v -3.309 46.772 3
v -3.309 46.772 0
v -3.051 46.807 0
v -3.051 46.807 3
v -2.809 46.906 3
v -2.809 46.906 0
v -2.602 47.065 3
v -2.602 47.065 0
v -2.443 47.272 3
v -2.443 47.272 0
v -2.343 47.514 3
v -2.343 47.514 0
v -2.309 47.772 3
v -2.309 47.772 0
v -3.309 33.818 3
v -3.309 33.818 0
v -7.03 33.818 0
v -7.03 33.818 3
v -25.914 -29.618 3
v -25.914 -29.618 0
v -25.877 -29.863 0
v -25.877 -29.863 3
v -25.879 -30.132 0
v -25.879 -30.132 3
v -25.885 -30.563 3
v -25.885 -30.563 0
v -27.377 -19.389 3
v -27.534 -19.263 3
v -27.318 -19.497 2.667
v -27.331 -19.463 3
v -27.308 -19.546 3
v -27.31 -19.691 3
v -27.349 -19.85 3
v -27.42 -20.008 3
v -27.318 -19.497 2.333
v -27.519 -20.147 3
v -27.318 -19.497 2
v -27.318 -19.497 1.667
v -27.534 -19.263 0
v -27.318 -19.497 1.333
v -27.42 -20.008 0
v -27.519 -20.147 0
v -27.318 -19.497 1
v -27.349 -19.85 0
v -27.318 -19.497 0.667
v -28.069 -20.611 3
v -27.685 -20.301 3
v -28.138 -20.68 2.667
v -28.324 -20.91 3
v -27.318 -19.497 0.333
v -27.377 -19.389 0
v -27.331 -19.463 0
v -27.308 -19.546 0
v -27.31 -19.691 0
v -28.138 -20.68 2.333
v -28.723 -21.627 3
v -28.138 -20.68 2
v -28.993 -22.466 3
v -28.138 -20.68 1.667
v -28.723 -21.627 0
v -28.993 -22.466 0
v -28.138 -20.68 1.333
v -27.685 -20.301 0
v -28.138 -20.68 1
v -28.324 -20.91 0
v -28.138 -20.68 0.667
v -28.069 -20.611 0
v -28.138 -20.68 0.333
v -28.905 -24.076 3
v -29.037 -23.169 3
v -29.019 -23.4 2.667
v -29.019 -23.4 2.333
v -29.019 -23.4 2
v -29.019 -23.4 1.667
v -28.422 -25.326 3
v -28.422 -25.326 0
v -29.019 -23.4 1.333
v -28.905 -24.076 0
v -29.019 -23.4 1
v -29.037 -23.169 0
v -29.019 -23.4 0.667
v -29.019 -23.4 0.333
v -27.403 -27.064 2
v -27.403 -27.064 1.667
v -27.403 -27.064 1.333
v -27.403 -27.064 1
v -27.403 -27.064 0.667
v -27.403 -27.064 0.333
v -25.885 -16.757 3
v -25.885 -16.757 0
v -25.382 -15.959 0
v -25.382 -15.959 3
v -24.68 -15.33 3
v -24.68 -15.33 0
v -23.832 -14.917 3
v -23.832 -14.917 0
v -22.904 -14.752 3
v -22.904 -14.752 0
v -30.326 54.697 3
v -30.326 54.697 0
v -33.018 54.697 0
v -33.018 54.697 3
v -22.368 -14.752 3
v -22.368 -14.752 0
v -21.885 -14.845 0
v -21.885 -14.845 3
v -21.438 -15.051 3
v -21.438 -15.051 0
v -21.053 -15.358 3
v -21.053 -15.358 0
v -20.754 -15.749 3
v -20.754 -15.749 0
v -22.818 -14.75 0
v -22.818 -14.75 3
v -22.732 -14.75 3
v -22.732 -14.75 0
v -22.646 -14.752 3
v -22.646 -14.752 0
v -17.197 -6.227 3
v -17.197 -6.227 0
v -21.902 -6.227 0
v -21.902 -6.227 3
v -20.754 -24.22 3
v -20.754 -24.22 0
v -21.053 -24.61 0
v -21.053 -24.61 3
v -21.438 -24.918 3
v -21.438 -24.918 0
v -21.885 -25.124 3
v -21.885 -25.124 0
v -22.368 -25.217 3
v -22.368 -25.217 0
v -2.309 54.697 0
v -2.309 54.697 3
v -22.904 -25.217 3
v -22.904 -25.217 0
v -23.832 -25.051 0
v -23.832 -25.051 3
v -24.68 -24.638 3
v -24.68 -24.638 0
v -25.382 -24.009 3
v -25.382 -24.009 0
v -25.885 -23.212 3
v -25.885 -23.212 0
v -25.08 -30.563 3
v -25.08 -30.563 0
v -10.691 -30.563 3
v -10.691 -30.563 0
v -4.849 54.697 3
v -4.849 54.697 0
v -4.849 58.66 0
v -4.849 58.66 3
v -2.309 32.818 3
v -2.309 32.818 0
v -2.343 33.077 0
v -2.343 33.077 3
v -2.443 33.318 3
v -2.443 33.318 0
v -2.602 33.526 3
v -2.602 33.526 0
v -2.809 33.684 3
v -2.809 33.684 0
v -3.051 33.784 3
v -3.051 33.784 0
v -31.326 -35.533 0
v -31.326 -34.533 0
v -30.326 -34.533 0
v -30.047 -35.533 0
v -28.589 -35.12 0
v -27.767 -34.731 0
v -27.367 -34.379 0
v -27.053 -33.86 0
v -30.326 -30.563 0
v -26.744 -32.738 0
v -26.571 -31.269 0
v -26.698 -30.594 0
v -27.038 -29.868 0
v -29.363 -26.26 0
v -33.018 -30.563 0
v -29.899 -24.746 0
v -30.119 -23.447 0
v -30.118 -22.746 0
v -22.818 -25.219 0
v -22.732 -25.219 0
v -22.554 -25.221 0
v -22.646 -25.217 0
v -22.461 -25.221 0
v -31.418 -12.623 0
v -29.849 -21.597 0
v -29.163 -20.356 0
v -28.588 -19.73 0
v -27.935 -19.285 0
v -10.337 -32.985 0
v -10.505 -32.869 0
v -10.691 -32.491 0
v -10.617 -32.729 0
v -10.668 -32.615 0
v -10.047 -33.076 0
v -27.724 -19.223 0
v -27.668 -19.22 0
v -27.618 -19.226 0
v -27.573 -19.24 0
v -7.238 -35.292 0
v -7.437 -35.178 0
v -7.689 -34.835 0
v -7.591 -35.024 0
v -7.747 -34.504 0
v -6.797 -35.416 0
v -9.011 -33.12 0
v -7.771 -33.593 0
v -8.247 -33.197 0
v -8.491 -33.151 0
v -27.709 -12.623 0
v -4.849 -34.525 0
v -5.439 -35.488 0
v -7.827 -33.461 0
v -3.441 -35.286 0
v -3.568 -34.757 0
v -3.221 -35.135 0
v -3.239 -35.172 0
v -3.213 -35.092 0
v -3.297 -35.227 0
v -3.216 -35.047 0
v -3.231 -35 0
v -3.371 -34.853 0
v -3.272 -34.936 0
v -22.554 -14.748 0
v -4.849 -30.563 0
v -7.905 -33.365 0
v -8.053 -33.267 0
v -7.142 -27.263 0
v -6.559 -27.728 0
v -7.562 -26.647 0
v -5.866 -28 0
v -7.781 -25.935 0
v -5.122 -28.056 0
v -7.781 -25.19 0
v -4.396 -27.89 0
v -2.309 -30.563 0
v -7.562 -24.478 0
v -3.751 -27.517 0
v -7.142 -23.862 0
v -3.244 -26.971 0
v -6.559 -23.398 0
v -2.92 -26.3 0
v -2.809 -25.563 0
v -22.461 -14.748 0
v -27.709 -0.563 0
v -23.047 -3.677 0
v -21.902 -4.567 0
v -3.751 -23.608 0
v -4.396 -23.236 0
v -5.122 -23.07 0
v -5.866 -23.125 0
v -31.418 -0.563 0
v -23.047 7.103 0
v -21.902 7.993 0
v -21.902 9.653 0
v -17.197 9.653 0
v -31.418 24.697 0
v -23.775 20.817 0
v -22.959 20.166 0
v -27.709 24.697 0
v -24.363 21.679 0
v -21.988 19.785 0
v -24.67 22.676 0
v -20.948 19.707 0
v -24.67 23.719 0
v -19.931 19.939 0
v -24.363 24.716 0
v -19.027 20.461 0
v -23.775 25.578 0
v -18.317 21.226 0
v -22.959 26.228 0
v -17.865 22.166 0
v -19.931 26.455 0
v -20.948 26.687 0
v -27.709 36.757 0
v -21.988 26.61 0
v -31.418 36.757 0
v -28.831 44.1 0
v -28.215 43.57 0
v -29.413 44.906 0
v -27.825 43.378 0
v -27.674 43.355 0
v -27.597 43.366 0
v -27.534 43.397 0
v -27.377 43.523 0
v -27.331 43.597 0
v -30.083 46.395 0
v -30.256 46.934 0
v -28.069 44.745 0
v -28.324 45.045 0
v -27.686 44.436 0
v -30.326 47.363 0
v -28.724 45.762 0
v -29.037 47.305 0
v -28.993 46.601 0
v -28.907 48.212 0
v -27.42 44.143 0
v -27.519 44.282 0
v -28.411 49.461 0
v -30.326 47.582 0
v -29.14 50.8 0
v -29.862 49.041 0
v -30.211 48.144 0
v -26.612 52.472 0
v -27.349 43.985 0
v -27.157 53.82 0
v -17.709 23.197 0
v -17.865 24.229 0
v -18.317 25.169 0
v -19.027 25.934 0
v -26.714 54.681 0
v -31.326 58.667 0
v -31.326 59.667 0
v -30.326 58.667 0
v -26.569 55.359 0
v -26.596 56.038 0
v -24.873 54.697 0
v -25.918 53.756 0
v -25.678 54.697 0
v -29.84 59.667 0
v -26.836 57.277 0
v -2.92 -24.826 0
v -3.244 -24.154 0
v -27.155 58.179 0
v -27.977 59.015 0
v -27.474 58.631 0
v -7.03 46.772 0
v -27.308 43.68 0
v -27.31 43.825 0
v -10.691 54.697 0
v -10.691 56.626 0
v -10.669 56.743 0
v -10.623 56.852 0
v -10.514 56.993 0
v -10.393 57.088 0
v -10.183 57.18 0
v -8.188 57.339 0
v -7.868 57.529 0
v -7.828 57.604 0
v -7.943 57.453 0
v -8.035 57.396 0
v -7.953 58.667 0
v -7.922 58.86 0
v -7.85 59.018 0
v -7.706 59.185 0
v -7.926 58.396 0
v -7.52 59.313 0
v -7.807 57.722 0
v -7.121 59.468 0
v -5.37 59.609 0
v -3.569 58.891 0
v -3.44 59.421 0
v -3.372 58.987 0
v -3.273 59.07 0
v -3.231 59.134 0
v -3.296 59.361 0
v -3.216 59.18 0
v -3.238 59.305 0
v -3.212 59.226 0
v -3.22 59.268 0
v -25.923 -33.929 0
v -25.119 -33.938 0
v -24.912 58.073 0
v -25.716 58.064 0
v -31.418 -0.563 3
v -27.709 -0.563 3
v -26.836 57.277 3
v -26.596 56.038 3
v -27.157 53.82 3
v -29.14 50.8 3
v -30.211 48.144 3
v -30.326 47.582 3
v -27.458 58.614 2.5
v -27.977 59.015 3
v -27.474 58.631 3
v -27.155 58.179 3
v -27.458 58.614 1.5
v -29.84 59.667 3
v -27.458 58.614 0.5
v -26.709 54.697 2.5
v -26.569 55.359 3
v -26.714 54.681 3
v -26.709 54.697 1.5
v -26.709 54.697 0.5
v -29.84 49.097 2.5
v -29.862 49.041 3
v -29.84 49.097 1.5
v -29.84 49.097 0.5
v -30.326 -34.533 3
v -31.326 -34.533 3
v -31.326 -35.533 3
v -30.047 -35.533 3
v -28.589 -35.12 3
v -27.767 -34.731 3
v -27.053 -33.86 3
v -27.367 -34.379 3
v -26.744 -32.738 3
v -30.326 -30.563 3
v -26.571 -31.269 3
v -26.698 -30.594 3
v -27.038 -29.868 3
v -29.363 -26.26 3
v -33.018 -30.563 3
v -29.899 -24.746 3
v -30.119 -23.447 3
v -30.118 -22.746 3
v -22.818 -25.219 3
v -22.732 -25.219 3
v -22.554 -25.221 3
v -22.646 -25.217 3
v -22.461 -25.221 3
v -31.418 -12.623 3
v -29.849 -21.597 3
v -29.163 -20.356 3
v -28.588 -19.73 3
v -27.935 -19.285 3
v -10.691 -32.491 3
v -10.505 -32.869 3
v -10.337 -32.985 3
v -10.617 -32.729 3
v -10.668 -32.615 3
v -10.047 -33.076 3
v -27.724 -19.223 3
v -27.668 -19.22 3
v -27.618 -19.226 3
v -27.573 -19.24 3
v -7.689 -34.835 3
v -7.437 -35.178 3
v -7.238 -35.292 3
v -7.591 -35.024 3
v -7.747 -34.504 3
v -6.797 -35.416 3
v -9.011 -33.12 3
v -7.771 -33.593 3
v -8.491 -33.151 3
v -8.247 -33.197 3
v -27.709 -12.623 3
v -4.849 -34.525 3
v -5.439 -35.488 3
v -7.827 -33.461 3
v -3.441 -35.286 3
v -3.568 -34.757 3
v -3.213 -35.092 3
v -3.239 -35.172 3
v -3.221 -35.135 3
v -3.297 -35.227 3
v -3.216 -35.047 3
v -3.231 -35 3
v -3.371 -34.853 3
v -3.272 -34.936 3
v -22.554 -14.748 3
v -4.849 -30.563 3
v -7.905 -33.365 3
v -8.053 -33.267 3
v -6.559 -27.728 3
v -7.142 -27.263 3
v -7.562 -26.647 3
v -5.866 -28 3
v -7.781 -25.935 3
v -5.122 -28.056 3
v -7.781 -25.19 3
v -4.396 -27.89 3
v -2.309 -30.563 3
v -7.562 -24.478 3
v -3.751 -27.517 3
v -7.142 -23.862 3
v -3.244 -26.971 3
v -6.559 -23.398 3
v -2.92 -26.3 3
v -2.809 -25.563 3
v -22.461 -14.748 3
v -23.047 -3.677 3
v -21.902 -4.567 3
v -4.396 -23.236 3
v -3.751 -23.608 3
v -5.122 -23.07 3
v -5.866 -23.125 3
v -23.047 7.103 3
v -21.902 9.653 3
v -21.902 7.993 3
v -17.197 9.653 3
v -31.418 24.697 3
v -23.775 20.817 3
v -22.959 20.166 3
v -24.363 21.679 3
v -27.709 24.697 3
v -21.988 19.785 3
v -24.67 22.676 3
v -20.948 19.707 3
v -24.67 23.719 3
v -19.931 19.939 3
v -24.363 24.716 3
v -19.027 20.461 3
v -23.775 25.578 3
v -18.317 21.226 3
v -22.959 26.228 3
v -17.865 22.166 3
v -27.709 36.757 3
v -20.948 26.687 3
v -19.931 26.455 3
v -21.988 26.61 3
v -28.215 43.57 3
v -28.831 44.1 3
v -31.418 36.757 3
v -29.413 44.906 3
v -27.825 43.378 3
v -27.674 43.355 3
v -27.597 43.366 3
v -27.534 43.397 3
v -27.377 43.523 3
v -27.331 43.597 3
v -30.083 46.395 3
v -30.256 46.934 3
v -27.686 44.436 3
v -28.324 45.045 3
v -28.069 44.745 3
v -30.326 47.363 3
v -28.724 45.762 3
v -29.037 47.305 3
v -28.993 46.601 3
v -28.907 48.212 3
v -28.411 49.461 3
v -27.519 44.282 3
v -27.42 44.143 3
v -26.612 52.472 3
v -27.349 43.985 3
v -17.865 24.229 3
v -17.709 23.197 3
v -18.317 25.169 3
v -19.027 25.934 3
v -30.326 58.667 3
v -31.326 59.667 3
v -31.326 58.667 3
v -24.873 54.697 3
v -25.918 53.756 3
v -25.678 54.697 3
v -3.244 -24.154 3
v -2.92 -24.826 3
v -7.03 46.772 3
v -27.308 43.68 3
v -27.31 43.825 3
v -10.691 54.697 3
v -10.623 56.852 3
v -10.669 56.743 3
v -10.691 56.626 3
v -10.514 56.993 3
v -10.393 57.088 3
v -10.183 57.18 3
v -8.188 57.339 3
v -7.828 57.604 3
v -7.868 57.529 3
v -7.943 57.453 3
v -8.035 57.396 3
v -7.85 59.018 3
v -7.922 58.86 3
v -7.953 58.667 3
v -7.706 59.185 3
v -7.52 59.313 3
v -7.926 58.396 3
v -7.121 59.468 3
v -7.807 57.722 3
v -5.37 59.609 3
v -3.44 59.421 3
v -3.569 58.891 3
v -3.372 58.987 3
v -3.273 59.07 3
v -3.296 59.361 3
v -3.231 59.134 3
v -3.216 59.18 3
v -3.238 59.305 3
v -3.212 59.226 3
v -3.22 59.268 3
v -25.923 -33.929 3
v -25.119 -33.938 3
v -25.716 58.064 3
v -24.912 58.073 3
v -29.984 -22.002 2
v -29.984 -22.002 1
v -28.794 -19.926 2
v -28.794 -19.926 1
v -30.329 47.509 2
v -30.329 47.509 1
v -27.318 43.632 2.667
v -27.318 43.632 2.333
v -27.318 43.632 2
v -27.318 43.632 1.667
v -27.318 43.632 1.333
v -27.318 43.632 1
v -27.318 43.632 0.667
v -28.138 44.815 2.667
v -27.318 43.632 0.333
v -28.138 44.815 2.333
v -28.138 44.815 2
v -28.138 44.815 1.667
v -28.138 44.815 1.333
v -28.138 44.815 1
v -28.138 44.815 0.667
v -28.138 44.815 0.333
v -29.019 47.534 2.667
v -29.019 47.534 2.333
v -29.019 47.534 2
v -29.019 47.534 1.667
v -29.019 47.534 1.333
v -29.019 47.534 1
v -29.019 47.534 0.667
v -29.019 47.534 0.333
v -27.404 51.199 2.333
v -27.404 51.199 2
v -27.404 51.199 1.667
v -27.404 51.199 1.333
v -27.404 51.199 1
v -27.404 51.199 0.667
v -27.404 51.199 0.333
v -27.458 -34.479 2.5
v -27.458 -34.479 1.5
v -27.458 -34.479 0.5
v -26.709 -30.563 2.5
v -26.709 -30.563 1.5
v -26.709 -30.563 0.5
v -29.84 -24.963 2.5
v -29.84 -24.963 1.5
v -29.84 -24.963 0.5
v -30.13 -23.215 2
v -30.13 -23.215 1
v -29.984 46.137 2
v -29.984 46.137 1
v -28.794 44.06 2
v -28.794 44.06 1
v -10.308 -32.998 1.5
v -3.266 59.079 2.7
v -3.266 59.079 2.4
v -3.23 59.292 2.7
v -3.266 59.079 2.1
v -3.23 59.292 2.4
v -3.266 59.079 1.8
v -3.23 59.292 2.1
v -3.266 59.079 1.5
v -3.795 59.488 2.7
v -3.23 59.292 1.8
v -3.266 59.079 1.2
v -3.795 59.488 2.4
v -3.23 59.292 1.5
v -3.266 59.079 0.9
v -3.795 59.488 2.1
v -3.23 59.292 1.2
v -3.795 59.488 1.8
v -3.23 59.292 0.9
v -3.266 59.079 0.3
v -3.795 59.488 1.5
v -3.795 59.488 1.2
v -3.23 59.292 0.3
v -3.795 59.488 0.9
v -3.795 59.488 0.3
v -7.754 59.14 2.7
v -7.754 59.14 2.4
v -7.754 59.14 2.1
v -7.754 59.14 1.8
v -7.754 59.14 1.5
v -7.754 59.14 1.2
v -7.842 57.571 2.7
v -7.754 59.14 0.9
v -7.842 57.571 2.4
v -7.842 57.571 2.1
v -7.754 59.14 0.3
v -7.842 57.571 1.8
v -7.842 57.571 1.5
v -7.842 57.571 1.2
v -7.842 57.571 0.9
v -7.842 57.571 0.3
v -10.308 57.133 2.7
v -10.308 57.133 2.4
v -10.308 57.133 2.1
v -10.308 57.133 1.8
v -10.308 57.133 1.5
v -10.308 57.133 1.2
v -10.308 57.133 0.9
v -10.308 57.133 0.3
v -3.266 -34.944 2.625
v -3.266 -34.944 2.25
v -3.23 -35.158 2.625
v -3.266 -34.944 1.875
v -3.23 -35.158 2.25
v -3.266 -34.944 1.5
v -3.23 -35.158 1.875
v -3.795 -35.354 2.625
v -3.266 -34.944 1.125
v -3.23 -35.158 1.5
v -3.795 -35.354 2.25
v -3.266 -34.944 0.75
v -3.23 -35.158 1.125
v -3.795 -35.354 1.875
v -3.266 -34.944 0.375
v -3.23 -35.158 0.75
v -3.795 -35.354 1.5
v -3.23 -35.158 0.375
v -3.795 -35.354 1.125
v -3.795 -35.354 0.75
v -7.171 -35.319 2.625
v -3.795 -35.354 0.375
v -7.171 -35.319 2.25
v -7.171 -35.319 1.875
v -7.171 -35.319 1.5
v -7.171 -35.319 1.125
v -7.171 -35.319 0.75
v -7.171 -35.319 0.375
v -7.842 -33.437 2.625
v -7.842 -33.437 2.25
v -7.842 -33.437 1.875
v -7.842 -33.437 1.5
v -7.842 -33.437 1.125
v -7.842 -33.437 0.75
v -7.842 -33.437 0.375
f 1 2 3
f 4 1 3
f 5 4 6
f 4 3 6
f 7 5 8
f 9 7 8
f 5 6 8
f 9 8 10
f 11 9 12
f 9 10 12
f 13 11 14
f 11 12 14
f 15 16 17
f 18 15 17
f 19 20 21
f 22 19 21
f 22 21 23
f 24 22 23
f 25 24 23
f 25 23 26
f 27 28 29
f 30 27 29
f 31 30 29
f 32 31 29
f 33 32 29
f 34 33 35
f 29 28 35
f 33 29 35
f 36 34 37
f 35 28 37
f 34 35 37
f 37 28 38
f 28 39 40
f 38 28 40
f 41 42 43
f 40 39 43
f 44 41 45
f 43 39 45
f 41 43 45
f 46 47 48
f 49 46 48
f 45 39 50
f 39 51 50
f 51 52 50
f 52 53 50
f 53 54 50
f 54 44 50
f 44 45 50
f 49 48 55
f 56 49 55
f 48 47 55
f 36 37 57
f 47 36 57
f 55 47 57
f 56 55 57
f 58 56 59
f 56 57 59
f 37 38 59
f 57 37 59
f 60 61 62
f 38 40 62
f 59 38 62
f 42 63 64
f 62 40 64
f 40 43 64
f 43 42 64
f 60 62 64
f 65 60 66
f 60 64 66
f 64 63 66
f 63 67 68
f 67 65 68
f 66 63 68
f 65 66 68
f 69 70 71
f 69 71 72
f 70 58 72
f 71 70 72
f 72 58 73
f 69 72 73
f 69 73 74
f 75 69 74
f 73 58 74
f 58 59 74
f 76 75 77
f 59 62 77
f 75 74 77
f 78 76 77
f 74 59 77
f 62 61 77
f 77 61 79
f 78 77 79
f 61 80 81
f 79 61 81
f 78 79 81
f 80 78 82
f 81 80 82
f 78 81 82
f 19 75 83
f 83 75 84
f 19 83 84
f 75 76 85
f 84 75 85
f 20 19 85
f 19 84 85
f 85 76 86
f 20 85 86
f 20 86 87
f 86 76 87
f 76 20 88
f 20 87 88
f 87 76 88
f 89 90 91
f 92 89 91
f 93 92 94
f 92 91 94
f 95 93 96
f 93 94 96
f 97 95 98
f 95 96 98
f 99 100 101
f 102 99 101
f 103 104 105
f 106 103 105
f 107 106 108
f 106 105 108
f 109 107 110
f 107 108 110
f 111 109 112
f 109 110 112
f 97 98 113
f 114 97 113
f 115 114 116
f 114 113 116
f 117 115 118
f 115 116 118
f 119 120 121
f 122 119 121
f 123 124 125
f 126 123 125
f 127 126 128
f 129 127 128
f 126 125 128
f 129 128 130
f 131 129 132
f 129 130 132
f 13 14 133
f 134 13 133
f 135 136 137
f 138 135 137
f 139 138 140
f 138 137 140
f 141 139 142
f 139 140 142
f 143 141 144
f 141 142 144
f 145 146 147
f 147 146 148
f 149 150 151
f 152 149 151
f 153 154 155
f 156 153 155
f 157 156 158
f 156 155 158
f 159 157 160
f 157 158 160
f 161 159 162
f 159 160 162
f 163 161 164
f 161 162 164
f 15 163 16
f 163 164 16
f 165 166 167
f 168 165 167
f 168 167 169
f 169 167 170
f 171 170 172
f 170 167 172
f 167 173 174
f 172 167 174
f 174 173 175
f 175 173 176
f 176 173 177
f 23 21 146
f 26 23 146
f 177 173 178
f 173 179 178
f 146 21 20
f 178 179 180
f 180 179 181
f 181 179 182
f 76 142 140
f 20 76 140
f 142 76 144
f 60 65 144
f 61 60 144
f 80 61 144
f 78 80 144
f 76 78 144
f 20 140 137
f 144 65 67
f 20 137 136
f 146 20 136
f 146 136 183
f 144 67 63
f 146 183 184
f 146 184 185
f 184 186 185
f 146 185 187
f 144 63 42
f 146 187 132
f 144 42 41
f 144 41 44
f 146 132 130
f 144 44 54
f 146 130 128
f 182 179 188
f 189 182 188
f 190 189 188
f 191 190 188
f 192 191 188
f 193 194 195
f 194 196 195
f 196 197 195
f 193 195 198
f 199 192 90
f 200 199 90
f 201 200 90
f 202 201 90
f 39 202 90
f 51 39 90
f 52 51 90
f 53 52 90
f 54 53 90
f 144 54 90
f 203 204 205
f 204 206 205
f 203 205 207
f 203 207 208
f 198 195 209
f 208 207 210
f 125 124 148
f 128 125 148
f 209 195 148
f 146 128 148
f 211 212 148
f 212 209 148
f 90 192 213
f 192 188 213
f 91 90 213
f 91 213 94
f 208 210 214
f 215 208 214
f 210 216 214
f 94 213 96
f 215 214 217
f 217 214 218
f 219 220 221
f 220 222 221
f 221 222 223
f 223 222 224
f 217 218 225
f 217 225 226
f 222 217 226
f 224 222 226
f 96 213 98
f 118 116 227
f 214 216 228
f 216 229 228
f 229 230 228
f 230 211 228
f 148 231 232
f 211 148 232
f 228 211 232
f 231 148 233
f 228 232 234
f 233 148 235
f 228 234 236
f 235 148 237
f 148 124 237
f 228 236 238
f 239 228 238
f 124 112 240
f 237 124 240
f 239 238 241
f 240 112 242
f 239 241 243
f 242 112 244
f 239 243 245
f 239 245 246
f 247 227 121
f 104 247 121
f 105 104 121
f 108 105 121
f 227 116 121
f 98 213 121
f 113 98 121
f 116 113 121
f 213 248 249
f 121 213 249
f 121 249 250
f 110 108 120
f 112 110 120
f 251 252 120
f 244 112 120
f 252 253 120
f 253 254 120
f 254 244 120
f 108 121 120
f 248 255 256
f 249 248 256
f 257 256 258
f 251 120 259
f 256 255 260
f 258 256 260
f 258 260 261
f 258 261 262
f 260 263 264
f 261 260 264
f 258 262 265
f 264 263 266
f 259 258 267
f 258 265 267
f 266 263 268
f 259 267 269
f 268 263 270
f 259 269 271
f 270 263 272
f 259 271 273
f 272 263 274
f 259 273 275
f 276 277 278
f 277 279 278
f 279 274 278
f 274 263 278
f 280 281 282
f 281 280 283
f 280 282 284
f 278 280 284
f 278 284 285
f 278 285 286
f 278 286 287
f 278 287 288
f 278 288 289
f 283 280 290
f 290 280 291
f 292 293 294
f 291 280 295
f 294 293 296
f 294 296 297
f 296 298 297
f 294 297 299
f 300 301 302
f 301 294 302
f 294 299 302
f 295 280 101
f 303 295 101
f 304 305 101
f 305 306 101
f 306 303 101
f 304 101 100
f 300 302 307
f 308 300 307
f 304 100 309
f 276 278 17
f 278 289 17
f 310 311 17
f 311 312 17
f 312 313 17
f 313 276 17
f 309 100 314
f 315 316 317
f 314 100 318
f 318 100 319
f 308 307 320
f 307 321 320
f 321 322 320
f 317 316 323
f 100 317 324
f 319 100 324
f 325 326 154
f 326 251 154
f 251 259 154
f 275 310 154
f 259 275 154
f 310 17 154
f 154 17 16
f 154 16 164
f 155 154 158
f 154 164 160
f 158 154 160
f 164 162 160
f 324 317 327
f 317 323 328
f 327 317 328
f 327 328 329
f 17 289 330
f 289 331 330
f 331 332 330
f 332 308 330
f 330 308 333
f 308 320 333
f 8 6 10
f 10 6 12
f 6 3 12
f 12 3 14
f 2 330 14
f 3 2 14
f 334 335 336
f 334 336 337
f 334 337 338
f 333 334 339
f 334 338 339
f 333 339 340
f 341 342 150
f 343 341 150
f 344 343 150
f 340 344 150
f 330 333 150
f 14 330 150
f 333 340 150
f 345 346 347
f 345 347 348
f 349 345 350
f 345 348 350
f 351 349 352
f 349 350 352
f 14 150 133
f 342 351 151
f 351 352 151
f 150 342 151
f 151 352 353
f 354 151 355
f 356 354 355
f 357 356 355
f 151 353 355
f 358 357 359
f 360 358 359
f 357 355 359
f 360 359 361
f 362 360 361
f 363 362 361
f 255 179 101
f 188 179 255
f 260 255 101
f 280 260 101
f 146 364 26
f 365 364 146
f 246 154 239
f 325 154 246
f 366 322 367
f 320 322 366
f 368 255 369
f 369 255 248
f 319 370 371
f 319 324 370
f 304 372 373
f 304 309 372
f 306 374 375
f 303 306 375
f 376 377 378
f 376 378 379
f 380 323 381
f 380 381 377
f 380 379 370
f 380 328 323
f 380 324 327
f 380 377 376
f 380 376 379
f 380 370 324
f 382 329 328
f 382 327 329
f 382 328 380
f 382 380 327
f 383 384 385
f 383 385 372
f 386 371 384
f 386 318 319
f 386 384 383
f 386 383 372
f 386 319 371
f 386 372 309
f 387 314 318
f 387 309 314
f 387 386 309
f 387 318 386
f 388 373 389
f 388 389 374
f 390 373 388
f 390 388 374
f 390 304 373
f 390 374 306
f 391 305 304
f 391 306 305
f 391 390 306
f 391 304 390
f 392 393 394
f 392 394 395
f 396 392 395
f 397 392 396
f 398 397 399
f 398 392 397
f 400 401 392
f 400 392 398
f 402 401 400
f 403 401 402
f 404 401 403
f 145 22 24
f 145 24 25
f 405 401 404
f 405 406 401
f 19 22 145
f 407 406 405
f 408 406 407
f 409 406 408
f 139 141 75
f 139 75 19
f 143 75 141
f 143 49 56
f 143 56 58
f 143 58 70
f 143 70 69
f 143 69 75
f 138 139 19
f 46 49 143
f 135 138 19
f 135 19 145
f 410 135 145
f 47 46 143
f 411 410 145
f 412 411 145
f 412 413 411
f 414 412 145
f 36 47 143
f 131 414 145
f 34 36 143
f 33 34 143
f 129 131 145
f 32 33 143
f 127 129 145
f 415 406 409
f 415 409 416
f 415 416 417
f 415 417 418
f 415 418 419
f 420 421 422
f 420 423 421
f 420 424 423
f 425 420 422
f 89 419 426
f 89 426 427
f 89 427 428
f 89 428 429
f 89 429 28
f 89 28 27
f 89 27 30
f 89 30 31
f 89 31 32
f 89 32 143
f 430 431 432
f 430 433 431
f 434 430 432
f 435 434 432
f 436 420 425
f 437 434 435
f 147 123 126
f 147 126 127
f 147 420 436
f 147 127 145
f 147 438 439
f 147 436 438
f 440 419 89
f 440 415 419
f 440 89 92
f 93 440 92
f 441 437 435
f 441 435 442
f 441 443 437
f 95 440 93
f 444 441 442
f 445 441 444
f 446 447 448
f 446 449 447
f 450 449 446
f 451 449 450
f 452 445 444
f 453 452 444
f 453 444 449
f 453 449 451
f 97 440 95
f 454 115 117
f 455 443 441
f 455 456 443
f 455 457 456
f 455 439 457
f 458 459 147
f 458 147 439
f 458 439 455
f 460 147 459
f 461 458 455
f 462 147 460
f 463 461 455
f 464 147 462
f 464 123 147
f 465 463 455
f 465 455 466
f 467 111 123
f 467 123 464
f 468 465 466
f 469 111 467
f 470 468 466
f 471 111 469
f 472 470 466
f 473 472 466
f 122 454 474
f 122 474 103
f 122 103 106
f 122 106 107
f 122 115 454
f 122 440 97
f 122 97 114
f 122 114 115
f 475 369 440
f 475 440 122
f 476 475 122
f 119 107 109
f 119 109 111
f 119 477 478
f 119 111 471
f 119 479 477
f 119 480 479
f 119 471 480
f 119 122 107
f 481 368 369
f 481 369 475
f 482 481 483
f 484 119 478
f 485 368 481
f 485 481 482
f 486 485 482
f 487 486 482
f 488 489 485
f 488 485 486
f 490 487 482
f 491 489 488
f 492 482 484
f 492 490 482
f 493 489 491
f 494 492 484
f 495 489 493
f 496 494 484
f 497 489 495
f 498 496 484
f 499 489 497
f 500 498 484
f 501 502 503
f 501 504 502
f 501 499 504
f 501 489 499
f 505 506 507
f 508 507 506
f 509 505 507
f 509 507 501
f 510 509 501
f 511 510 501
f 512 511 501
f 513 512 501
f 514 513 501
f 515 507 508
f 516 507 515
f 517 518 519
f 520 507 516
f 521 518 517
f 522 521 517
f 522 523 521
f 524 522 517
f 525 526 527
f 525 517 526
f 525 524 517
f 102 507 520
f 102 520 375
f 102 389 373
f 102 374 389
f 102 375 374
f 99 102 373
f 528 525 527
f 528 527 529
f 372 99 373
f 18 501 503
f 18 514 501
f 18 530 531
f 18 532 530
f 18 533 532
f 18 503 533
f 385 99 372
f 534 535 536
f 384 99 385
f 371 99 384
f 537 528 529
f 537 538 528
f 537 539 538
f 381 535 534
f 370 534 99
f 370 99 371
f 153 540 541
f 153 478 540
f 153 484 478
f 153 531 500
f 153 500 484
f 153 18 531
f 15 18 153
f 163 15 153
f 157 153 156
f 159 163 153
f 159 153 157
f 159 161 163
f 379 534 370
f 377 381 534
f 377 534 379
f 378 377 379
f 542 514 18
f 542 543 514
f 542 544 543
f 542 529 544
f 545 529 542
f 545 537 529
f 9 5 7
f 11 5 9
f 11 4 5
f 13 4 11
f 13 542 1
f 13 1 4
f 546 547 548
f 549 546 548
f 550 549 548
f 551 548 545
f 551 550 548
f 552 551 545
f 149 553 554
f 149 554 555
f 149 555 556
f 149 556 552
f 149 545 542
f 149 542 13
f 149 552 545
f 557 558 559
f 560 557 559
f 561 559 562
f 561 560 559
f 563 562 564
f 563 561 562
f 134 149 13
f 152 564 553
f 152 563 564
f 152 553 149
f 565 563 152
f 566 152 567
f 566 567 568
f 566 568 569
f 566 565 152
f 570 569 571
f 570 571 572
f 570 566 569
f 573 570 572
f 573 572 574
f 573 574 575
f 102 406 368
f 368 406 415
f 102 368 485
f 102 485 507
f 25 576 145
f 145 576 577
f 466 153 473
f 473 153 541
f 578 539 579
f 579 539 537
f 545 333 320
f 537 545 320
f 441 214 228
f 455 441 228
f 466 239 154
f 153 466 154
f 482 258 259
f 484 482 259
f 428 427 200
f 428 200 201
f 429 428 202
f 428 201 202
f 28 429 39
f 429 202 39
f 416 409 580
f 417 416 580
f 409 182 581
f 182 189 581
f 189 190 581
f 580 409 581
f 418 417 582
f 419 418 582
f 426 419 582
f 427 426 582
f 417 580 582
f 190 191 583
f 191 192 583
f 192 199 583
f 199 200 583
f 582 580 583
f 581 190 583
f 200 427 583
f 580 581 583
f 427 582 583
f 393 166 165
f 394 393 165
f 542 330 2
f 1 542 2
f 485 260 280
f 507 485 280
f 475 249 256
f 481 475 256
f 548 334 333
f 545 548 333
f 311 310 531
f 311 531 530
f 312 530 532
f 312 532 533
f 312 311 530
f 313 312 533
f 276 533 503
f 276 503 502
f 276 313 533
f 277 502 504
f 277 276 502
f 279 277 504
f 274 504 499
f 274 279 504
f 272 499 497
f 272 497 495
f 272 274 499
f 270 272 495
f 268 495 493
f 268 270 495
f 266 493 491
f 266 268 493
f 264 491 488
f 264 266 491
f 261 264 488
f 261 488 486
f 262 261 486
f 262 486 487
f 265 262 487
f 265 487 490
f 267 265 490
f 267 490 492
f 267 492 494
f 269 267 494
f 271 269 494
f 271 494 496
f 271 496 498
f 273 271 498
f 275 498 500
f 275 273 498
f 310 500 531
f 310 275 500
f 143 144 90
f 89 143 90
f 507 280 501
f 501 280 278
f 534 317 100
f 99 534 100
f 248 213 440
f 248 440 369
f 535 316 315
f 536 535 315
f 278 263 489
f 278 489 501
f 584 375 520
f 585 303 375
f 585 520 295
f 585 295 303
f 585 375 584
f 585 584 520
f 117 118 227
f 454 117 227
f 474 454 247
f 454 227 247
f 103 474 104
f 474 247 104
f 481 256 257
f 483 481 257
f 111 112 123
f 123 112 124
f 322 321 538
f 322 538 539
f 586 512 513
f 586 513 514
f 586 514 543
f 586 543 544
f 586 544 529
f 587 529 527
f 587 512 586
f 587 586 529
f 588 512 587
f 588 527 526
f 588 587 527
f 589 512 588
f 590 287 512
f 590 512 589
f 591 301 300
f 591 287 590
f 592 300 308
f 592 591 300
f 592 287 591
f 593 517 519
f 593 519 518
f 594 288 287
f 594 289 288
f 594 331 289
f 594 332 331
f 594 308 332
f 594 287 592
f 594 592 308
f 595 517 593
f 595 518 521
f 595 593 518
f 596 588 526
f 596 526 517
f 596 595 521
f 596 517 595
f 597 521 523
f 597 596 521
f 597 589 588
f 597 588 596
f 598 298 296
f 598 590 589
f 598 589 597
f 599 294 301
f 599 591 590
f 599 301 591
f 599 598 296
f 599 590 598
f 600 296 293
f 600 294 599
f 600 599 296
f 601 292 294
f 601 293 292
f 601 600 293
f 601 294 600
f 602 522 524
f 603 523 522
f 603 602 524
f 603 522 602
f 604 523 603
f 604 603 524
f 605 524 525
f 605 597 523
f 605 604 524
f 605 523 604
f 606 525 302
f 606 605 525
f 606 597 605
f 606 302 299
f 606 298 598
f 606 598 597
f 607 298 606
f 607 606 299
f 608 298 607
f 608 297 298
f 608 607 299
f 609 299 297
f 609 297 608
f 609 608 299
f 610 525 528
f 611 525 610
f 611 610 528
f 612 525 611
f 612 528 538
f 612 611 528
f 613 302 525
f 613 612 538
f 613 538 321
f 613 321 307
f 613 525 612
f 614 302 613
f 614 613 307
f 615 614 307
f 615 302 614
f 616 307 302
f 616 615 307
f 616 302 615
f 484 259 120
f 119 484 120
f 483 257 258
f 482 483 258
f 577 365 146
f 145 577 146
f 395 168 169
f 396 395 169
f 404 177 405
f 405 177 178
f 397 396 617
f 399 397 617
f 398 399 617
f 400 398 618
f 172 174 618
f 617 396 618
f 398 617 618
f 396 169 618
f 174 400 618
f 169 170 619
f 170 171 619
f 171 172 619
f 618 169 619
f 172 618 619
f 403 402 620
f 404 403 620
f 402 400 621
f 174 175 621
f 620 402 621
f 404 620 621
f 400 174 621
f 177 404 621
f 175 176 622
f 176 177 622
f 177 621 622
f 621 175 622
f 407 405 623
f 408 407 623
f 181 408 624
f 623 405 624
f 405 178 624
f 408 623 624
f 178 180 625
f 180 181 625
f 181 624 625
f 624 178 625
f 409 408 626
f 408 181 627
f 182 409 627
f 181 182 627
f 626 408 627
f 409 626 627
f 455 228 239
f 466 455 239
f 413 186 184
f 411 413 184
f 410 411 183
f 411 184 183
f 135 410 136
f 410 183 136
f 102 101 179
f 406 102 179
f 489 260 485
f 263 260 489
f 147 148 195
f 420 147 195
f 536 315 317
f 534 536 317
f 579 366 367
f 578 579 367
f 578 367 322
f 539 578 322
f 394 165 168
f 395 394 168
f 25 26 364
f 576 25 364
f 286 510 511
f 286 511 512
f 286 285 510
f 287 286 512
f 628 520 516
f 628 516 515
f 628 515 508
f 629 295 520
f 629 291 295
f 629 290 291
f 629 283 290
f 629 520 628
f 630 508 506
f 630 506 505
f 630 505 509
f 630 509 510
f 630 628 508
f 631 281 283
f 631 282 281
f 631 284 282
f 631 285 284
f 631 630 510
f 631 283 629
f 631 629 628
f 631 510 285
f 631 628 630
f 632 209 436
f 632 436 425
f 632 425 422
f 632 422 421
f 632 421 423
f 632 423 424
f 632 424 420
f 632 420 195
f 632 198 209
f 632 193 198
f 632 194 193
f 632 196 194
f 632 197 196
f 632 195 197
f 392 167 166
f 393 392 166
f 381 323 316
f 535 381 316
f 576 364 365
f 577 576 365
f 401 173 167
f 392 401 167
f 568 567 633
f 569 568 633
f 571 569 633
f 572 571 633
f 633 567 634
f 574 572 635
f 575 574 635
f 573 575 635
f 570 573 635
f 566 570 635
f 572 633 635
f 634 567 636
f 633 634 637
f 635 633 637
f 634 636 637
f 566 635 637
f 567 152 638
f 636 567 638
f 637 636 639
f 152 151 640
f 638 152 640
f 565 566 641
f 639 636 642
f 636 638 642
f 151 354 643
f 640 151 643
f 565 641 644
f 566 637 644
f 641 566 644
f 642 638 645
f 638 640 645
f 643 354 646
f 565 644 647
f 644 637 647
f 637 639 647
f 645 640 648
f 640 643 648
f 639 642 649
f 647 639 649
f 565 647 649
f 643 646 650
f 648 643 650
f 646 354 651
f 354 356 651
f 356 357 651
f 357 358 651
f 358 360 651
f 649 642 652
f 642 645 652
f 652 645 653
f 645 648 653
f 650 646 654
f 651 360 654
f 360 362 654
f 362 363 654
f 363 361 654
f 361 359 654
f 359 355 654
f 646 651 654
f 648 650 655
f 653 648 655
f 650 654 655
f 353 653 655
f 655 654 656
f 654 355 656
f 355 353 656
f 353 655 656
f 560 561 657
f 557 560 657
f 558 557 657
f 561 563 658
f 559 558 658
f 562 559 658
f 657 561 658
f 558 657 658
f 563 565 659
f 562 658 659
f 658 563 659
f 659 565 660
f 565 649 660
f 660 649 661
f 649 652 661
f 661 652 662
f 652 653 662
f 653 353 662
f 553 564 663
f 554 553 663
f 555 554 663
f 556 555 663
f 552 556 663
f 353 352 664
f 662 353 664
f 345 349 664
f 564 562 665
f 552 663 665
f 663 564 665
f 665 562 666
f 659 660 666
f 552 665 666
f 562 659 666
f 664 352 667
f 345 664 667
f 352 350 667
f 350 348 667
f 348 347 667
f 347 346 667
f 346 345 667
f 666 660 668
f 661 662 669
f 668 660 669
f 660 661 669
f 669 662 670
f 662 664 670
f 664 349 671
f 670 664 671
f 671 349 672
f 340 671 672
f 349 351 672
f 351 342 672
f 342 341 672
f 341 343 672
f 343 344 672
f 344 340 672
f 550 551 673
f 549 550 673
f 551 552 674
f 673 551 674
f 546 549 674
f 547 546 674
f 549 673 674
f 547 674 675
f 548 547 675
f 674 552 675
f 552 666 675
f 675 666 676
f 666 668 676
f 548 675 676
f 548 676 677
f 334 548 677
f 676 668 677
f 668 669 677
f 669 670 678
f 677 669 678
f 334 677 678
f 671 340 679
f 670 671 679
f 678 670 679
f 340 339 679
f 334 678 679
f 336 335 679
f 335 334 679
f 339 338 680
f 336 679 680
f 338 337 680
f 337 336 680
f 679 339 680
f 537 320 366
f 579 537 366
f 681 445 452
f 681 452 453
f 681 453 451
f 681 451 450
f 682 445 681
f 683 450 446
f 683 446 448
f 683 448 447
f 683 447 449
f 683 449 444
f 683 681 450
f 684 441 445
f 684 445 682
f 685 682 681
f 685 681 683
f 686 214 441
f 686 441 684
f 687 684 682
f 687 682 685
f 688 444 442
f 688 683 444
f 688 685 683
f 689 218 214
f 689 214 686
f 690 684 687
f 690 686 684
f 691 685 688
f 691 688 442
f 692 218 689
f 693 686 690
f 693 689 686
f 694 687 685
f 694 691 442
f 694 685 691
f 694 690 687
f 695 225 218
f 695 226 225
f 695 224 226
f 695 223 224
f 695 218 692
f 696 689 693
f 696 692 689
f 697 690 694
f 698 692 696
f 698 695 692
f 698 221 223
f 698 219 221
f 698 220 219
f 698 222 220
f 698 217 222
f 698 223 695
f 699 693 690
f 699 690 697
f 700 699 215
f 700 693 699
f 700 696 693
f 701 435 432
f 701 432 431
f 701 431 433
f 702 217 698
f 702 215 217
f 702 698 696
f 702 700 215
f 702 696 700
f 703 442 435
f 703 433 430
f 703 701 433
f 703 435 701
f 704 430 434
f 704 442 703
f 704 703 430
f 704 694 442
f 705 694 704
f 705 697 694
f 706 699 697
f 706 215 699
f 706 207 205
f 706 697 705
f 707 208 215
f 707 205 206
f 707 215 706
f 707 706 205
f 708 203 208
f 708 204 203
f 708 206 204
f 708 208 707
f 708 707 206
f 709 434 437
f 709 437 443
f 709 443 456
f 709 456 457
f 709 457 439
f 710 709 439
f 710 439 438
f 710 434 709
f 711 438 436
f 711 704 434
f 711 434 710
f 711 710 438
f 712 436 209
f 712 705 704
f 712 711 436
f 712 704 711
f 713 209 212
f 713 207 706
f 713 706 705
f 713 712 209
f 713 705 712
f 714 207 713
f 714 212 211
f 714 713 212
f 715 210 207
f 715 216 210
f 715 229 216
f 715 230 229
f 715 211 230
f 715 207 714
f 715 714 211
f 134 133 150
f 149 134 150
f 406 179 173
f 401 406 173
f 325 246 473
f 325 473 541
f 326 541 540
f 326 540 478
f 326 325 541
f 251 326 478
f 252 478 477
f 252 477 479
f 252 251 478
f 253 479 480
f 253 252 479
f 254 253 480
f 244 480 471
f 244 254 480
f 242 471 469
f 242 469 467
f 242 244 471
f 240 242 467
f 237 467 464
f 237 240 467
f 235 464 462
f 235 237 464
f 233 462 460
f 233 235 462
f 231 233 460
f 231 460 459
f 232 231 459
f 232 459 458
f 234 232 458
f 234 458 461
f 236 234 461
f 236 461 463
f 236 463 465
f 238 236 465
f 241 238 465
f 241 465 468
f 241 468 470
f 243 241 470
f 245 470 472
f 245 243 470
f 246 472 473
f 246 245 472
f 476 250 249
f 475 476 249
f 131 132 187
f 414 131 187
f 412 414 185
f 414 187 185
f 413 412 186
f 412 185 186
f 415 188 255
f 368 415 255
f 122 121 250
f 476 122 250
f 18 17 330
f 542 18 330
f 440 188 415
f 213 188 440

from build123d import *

# Parameters (mm, degrees)
F0_W     = 3.7084
F0_H     = 12.06
F0_R     = 2.5
F0_R_2   = 3.5
F1_DEPTH = 3


with BuildPart() as f1:
    # F0 (on Top) → F1 (new body)
    with BuildSketch(Plane.XY):
        with BuildLine():
            Line((-30.3255202817, 54.6972608811), (-33.0179202817, 54.6972608811))
            Line((-33.0179202817, 54.6972608811), (-33.0179202817, -30.5627391189))
            Line((-33.0179202817, -30.5627391189), (-30.3255202817, -30.5627391189))
            Line((-30.3255202817, -30.5627391189), (-30.3255202817, -34.5327391189))
            Line((-30.3255202817, -34.5327391189), (-31.3255202817, -34.5327391189))
            Line((-31.3255202817, -34.5327391189), (-31.3255202817, -35.5327391189))
            Line((-31.3255202817, -35.5327391189), (-30.0465778309, -35.5327391189))
            add(Edge.make_bspline(
                [(-30.0465778309, -35.5327391189), (-29.0542660125, -35.2685021322), (-27.1312752249, -34.861753353), (-26.7034450117, -32.4983814243), (-26.3027082761, -30.4256681512), (-28.9224390093, -27.4970702453), (-29.8794002046, -25.057892097), (-30.0850495272, -23.9257134), (-30.1185005971, -23.4473318782)],
                knots=[0, 0, 0, 0, 0.1206112414, 0.224448157, 0.3260915004, 0.4658356432, 0.5839561245, 0.6735096428, 0.6735096428, 0.6735096428, 0.6735096428], degree=3))
            add(Edge.make_bspline(
                [(-30.1185005971, -23.4473318782), (-30.1347735406, -23.2146135975), (-30.1379762837, -22.9842236069), (-30.1184997649, -22.7460887202)],
                knots=[0.6735096428, 0.6735096428, 0.6735096428, 0.6735096428, 0.717074747, 0.717074747, 0.717074747, 0.717074747], degree=3))
            add(Edge.make_bspline(
                [(-30.1184997649, -22.7460887202), (-30.0991217901, -22.5091587059), (-29.949587152, -21.6347347705), (-29.0824860737, -19.9248292282), (-27.7537398554, -19.0928034317), (-27.5335005971, -19.2627391189)],
                knots=[0.717074747, 0.717074747, 0.717074747, 0.717074747, 0.7604194282, 0.8720303172, 0.9581218014, 0.9581218014, 0.9581218014, 0.9581218014], degree=3))
            add(Edge.make_bspline(
                [(-27.5335005971, -19.2627391189), (-27.4419565035, -19.3237464606), (-27.2236001371, -19.4692682262), (-27.4229707249, -20.2204130794), (-28.2568417379, -20.5735485862), (-29.0688276696, -22.2682997811), (-29.048270231, -23.4073773795), (-28.8076640714, -24.7098437986), (-27.4984927375, -27.0537445911), (-25.6509412483, -29.5161804605), (-25.9222293614, -30.2941341727), (-25.8846127289, -30.5627391189)],
                knots=[0, 0, 0, 0, 0.0555574968, 0.1328440618, 0.225421424, 0.3569608994, 0.4616530765, 0.5708084503, 0.7356855595, 0.905685347, 1, 1, 1, 1], degree=3))
            Line((-25.8846127289, -30.5627391189), (-25.9227476544, -33.9293153014))
            Line((-25.9227476544, -33.9293153014), (-25.1185202817, -33.9384251951))
            Line((-25.1185202817, -33.9384251951), (-25.0802821638, -30.5627391189))
            Line((-25.0802821638, -30.5627391189), (-10.6913202817, -30.5627391189))
            Line((-10.6913202817, -30.5627391189), (-10.6913202817, -32.491491082))
            add(Edge.make_bspline(
                [(-9.0111005971, -33.1198246207), (-9.5104731019, -33.1125810807), (-10.3246713293, -33.1645274657), (-10.6749330928, -32.7109473036), (-10.6913202817, -32.491491082)],
                knots=[0.8053619594, 0.8053619594, 0.8053619594, 0.8053619594, 0.9199732187, 1, 1, 1, 1], degree=3))
            add(Edge.make_bspline(
                [(-4.8493202817, -34.5251391189), (-4.5598271377, -34.5742578802), (-3.8944496954, -34.6175113453), (-3.2277093509, -34.8723543508), (-3.1809502223, -35.2322471625), (-3.8577286947, -35.4118651006), (-7.3470859543, -35.6849731368), (-7.8658240881, -34.58367362), (-7.5547970986, -33.2089896094), (-8.5296328153, -33.1268084476), (-9.0111005971, -33.1198246207)],
                knots=[0, 0, 0, 0, 0.0999788563, 0.1816864817, 0.2284028423, 0.3060193801, 0.4905041385, 0.5899200265, 0.6948600229, 0.8053619594, 0.8053619594, 0.8053619594, 0.8053619594], degree=3))
            Line((-4.8493202817, -34.5251391189), (-4.8493202817, -30.5627391189))
            Line((-4.8493202817, -30.5627391189), (-2.3093202817, -30.5627391189))
            Line((-2.3093202817, -30.5627391189), (-2.3093202817, 32.8184608811))
            ThreePointArc((-2.3093202817, 32.8184608811), (-2.6022135006, 33.5255676623), (-3.3093202817, 33.8184608811))
            Line((-3.3093202817, 33.8184608811), (-7.0299005971, 33.8184608811))
            Line((-7.0299005971, 33.8184608811), (-7.0299005971, 46.7724608811))
            Line((-7.0299005971, 46.7724608811), (-3.3093202817, 46.7724608811))
            ThreePointArc((-3.3093202817, 46.7724608811), (-2.6022135006, 47.0653540999), (-2.3093202817, 47.7724608811))
            Line((-2.3093202817, 47.7724608811), (-2.3093202817, 54.6972608811))
            Line((-2.3093202817, 54.6972608811), (-4.8493202817, 54.6972608811))
            Line((-4.8493202817, 54.6972608811), (-4.8493202817, 58.6596608811))
            add(Edge.make_bspline(
                [(-4.8493202817, 58.6596608811), (-4.5617399693, 58.7084550892), (-3.8933589127, 58.7520656237), (-3.2286250578, 59.0070734433), (-3.1788282676, 59.366232748), (-3.8803713676, 59.5522491057), (-7.2374062882, 59.7795334193), (-8.2039564746, 58.7601549354), (-7.4608966899, 57.3400786879), (-9.0753517903, 57.2183445779), (-10.3192401725, 57.2998260761), (-10.6750413714, 56.8440190045), (-10.6913202817, 56.6260128441)],
                knots=[0, 0, 0, 0, 0.0993182441, 0.1804859847, 0.2268936661, 0.3039973511, 0.4872631229, 0.5925610324, 0.6968762413, 0.806648034, 0.9205019972, 1, 1, 1, 1], degree=3))
            Line((-10.6913202817, 56.6260128441), (-10.6913202817, 54.6972608811))
            Line((-10.6913202817, 54.6972608811), (-24.8732624792, 54.6972608811))
            Line((-24.8732624792, 54.6972608811), (-24.9115005888, 58.0729470142))
            Line((-24.9115005888, 58.0729470142), (-25.7157279615, 58.0638371227))
            Line((-25.7157279615, 58.0638371227), (-25.6775930443, 54.6972608811))
            add(Edge.make_bspline(
                [(-27.5335005971, 43.3972608811), (-27.4420878726, 43.458180675), (-27.2235099986, 43.6038466512), (-27.4230277063, 44.3549153311), (-28.2566925656, 44.7080719301), (-29.0695070788, 46.4028559785), (-29.0462971883, 47.5417930568), (-28.817109508, 48.8448704557), (-27.4420350281, 51.1852051842), (-25.8214841356, 53.6691447705), (-25.7157279615, 54.4249550762), (-25.6775930443, 54.6972608811)],
                knots=[0, 0, 0, 0, 0.0554777698, 0.1326534257, 0.2250979361, 0.3564486475, 0.4609905876, 0.5699893194, 0.7346282553, 0.9043858727, 1, 1, 1, 1], degree=3))
            add(Edge.make_bspline(
                [(-30.3255202817, 47.363353879), (-30.3021743332, 46.9752354762), (-29.9451588522, 45.9909590292), (-29.1102476588, 44.058309756), (-27.7560898154, 43.227303649), (-27.5335005971, 43.3972608811)],
                knots=[0.6858638974, 0.6858638974, 0.6858638974, 0.6858638974, 0.760005146, 0.8718090323, 0.9580493857, 0.9580493857, 0.9580493857, 0.9580493857], degree=3))
            add(Edge.make_bspline(
                [(-30.3255202817, 47.5818536404), (-30.3300917762, 47.5089567217), (-30.3299040056, 47.4362317879), (-30.3255202817, 47.363353879)],
                knots=[0.6719422201, 0.6719422201, 0.6719422201, 0.6719422201, 0.6858638974, 0.6858638974, 0.6858638974, 0.6858638974], degree=3))
            add(Edge.make_bspline(
                [(-29.8395581462, 59.6672608811), (-28.8800176747, 59.4117503871), (-27.1675545938, 58.9558795646), (-26.6951478075, 56.6355261243), (-26.2975507344, 54.5585972446), (-28.966783586, 51.6350792711), (-29.7577958737, 49.1731274375), (-30.2955831957, 48.05922955), (-30.3255202817, 47.5818536404)],
                knots=[0, 0, 0, 0, 0.1166280249, 0.220644495, 0.3224635999, 0.462449388, 0.580774123, 0.6719422201, 0.6719422201, 0.6719422201, 0.6719422201], degree=3))
            Line((-29.8395581462, 59.6672608811), (-31.3255202817, 59.6672608811))
            Line((-31.3255202817, 59.6672608811), (-31.3255202817, 58.6672608811))
            Line((-31.3255202817, 58.6672608811), (-30.3255202817, 58.6672608811))
            Line((-30.3255202817, 58.6672608811), (-30.3255202817, 54.6972608811))
        make_face()
        with BuildLine():
            ThreePointArc((-22.6463557082, -25.2167526633), (-22.7753526566, -25.2191921124), (-22.904349605, -25.2167526633))
            ThreePointArc((-22.904349605, -25.2167526633), (-24.6796244618, -24.6383299025), (-25.8846127289, -23.2120841371))
            Line((-25.8846127289, -23.2120841371), (-25.8846127289, -16.7566211894))
            ThreePointArc((-25.8846127289, -16.7566211894), (-24.6796244618, -15.330375424), (-22.904349605, -14.7519526633))
            ThreePointArc((-22.904349605, -14.7519526633), (-22.7753526566, -14.7495132141), (-22.6463557082, -14.7519526633))
            ThreePointArc((-22.6463557082, -14.7519526633), (-22.507300004, -14.7471973552), (-22.3682442997, -14.7519526633))
            ThreePointArc((-22.3682442997, -14.7519526633), (-21.4377485722, -15.0508383898), (-20.7538127289, -15.7489692792))
            Line((-20.7538127289, -15.7489692792), (-20.7538127289, -24.2197360473))
            ThreePointArc((-20.7538127289, -24.2197360473), (-21.4377485722, -24.9178669367), (-22.3682442997, -25.2167526633))
            ThreePointArc((-22.3682442997, -25.2167526633), (-22.507300004, -25.2215079713), (-22.6463557082, -25.2167526633))
        make_face(mode=Mode.SUBTRACT)
        with Locations((-29.5635202817, -6.5927391189)):
            Rectangle(F0_W, F0_H, mode=Mode.SUBTRACT)
        Polygon((-17.1965047061, -6.2271989882), (-21.9022054225, -6.2271989882), (-21.9022054225, -4.5671989882), (-23.0465047061, -3.6771989882), (-23.0465047061, 7.1028010118), (-21.9022054225, 7.9928010118), (-21.9022054225, 9.6528010118), (-17.1965047061, 9.6528010118), align=None, mode=Mode.SUBTRACT)
        with Locations((-5.3093202817, -25.5627391189)):
            Circle(F0_R, mode=Mode.SUBTRACT)
        with Locations((-29.5635202817, 30.7272608811)):
            Rectangle(F0_W, F0_H, mode=Mode.SUBTRACT)
        with Locations((-21.2093202817, 23.1972608811)):
            Circle(F0_R_2, mode=Mode.SUBTRACT)
    extrude(amount=F1_DEPTH)


solid = f1.part
